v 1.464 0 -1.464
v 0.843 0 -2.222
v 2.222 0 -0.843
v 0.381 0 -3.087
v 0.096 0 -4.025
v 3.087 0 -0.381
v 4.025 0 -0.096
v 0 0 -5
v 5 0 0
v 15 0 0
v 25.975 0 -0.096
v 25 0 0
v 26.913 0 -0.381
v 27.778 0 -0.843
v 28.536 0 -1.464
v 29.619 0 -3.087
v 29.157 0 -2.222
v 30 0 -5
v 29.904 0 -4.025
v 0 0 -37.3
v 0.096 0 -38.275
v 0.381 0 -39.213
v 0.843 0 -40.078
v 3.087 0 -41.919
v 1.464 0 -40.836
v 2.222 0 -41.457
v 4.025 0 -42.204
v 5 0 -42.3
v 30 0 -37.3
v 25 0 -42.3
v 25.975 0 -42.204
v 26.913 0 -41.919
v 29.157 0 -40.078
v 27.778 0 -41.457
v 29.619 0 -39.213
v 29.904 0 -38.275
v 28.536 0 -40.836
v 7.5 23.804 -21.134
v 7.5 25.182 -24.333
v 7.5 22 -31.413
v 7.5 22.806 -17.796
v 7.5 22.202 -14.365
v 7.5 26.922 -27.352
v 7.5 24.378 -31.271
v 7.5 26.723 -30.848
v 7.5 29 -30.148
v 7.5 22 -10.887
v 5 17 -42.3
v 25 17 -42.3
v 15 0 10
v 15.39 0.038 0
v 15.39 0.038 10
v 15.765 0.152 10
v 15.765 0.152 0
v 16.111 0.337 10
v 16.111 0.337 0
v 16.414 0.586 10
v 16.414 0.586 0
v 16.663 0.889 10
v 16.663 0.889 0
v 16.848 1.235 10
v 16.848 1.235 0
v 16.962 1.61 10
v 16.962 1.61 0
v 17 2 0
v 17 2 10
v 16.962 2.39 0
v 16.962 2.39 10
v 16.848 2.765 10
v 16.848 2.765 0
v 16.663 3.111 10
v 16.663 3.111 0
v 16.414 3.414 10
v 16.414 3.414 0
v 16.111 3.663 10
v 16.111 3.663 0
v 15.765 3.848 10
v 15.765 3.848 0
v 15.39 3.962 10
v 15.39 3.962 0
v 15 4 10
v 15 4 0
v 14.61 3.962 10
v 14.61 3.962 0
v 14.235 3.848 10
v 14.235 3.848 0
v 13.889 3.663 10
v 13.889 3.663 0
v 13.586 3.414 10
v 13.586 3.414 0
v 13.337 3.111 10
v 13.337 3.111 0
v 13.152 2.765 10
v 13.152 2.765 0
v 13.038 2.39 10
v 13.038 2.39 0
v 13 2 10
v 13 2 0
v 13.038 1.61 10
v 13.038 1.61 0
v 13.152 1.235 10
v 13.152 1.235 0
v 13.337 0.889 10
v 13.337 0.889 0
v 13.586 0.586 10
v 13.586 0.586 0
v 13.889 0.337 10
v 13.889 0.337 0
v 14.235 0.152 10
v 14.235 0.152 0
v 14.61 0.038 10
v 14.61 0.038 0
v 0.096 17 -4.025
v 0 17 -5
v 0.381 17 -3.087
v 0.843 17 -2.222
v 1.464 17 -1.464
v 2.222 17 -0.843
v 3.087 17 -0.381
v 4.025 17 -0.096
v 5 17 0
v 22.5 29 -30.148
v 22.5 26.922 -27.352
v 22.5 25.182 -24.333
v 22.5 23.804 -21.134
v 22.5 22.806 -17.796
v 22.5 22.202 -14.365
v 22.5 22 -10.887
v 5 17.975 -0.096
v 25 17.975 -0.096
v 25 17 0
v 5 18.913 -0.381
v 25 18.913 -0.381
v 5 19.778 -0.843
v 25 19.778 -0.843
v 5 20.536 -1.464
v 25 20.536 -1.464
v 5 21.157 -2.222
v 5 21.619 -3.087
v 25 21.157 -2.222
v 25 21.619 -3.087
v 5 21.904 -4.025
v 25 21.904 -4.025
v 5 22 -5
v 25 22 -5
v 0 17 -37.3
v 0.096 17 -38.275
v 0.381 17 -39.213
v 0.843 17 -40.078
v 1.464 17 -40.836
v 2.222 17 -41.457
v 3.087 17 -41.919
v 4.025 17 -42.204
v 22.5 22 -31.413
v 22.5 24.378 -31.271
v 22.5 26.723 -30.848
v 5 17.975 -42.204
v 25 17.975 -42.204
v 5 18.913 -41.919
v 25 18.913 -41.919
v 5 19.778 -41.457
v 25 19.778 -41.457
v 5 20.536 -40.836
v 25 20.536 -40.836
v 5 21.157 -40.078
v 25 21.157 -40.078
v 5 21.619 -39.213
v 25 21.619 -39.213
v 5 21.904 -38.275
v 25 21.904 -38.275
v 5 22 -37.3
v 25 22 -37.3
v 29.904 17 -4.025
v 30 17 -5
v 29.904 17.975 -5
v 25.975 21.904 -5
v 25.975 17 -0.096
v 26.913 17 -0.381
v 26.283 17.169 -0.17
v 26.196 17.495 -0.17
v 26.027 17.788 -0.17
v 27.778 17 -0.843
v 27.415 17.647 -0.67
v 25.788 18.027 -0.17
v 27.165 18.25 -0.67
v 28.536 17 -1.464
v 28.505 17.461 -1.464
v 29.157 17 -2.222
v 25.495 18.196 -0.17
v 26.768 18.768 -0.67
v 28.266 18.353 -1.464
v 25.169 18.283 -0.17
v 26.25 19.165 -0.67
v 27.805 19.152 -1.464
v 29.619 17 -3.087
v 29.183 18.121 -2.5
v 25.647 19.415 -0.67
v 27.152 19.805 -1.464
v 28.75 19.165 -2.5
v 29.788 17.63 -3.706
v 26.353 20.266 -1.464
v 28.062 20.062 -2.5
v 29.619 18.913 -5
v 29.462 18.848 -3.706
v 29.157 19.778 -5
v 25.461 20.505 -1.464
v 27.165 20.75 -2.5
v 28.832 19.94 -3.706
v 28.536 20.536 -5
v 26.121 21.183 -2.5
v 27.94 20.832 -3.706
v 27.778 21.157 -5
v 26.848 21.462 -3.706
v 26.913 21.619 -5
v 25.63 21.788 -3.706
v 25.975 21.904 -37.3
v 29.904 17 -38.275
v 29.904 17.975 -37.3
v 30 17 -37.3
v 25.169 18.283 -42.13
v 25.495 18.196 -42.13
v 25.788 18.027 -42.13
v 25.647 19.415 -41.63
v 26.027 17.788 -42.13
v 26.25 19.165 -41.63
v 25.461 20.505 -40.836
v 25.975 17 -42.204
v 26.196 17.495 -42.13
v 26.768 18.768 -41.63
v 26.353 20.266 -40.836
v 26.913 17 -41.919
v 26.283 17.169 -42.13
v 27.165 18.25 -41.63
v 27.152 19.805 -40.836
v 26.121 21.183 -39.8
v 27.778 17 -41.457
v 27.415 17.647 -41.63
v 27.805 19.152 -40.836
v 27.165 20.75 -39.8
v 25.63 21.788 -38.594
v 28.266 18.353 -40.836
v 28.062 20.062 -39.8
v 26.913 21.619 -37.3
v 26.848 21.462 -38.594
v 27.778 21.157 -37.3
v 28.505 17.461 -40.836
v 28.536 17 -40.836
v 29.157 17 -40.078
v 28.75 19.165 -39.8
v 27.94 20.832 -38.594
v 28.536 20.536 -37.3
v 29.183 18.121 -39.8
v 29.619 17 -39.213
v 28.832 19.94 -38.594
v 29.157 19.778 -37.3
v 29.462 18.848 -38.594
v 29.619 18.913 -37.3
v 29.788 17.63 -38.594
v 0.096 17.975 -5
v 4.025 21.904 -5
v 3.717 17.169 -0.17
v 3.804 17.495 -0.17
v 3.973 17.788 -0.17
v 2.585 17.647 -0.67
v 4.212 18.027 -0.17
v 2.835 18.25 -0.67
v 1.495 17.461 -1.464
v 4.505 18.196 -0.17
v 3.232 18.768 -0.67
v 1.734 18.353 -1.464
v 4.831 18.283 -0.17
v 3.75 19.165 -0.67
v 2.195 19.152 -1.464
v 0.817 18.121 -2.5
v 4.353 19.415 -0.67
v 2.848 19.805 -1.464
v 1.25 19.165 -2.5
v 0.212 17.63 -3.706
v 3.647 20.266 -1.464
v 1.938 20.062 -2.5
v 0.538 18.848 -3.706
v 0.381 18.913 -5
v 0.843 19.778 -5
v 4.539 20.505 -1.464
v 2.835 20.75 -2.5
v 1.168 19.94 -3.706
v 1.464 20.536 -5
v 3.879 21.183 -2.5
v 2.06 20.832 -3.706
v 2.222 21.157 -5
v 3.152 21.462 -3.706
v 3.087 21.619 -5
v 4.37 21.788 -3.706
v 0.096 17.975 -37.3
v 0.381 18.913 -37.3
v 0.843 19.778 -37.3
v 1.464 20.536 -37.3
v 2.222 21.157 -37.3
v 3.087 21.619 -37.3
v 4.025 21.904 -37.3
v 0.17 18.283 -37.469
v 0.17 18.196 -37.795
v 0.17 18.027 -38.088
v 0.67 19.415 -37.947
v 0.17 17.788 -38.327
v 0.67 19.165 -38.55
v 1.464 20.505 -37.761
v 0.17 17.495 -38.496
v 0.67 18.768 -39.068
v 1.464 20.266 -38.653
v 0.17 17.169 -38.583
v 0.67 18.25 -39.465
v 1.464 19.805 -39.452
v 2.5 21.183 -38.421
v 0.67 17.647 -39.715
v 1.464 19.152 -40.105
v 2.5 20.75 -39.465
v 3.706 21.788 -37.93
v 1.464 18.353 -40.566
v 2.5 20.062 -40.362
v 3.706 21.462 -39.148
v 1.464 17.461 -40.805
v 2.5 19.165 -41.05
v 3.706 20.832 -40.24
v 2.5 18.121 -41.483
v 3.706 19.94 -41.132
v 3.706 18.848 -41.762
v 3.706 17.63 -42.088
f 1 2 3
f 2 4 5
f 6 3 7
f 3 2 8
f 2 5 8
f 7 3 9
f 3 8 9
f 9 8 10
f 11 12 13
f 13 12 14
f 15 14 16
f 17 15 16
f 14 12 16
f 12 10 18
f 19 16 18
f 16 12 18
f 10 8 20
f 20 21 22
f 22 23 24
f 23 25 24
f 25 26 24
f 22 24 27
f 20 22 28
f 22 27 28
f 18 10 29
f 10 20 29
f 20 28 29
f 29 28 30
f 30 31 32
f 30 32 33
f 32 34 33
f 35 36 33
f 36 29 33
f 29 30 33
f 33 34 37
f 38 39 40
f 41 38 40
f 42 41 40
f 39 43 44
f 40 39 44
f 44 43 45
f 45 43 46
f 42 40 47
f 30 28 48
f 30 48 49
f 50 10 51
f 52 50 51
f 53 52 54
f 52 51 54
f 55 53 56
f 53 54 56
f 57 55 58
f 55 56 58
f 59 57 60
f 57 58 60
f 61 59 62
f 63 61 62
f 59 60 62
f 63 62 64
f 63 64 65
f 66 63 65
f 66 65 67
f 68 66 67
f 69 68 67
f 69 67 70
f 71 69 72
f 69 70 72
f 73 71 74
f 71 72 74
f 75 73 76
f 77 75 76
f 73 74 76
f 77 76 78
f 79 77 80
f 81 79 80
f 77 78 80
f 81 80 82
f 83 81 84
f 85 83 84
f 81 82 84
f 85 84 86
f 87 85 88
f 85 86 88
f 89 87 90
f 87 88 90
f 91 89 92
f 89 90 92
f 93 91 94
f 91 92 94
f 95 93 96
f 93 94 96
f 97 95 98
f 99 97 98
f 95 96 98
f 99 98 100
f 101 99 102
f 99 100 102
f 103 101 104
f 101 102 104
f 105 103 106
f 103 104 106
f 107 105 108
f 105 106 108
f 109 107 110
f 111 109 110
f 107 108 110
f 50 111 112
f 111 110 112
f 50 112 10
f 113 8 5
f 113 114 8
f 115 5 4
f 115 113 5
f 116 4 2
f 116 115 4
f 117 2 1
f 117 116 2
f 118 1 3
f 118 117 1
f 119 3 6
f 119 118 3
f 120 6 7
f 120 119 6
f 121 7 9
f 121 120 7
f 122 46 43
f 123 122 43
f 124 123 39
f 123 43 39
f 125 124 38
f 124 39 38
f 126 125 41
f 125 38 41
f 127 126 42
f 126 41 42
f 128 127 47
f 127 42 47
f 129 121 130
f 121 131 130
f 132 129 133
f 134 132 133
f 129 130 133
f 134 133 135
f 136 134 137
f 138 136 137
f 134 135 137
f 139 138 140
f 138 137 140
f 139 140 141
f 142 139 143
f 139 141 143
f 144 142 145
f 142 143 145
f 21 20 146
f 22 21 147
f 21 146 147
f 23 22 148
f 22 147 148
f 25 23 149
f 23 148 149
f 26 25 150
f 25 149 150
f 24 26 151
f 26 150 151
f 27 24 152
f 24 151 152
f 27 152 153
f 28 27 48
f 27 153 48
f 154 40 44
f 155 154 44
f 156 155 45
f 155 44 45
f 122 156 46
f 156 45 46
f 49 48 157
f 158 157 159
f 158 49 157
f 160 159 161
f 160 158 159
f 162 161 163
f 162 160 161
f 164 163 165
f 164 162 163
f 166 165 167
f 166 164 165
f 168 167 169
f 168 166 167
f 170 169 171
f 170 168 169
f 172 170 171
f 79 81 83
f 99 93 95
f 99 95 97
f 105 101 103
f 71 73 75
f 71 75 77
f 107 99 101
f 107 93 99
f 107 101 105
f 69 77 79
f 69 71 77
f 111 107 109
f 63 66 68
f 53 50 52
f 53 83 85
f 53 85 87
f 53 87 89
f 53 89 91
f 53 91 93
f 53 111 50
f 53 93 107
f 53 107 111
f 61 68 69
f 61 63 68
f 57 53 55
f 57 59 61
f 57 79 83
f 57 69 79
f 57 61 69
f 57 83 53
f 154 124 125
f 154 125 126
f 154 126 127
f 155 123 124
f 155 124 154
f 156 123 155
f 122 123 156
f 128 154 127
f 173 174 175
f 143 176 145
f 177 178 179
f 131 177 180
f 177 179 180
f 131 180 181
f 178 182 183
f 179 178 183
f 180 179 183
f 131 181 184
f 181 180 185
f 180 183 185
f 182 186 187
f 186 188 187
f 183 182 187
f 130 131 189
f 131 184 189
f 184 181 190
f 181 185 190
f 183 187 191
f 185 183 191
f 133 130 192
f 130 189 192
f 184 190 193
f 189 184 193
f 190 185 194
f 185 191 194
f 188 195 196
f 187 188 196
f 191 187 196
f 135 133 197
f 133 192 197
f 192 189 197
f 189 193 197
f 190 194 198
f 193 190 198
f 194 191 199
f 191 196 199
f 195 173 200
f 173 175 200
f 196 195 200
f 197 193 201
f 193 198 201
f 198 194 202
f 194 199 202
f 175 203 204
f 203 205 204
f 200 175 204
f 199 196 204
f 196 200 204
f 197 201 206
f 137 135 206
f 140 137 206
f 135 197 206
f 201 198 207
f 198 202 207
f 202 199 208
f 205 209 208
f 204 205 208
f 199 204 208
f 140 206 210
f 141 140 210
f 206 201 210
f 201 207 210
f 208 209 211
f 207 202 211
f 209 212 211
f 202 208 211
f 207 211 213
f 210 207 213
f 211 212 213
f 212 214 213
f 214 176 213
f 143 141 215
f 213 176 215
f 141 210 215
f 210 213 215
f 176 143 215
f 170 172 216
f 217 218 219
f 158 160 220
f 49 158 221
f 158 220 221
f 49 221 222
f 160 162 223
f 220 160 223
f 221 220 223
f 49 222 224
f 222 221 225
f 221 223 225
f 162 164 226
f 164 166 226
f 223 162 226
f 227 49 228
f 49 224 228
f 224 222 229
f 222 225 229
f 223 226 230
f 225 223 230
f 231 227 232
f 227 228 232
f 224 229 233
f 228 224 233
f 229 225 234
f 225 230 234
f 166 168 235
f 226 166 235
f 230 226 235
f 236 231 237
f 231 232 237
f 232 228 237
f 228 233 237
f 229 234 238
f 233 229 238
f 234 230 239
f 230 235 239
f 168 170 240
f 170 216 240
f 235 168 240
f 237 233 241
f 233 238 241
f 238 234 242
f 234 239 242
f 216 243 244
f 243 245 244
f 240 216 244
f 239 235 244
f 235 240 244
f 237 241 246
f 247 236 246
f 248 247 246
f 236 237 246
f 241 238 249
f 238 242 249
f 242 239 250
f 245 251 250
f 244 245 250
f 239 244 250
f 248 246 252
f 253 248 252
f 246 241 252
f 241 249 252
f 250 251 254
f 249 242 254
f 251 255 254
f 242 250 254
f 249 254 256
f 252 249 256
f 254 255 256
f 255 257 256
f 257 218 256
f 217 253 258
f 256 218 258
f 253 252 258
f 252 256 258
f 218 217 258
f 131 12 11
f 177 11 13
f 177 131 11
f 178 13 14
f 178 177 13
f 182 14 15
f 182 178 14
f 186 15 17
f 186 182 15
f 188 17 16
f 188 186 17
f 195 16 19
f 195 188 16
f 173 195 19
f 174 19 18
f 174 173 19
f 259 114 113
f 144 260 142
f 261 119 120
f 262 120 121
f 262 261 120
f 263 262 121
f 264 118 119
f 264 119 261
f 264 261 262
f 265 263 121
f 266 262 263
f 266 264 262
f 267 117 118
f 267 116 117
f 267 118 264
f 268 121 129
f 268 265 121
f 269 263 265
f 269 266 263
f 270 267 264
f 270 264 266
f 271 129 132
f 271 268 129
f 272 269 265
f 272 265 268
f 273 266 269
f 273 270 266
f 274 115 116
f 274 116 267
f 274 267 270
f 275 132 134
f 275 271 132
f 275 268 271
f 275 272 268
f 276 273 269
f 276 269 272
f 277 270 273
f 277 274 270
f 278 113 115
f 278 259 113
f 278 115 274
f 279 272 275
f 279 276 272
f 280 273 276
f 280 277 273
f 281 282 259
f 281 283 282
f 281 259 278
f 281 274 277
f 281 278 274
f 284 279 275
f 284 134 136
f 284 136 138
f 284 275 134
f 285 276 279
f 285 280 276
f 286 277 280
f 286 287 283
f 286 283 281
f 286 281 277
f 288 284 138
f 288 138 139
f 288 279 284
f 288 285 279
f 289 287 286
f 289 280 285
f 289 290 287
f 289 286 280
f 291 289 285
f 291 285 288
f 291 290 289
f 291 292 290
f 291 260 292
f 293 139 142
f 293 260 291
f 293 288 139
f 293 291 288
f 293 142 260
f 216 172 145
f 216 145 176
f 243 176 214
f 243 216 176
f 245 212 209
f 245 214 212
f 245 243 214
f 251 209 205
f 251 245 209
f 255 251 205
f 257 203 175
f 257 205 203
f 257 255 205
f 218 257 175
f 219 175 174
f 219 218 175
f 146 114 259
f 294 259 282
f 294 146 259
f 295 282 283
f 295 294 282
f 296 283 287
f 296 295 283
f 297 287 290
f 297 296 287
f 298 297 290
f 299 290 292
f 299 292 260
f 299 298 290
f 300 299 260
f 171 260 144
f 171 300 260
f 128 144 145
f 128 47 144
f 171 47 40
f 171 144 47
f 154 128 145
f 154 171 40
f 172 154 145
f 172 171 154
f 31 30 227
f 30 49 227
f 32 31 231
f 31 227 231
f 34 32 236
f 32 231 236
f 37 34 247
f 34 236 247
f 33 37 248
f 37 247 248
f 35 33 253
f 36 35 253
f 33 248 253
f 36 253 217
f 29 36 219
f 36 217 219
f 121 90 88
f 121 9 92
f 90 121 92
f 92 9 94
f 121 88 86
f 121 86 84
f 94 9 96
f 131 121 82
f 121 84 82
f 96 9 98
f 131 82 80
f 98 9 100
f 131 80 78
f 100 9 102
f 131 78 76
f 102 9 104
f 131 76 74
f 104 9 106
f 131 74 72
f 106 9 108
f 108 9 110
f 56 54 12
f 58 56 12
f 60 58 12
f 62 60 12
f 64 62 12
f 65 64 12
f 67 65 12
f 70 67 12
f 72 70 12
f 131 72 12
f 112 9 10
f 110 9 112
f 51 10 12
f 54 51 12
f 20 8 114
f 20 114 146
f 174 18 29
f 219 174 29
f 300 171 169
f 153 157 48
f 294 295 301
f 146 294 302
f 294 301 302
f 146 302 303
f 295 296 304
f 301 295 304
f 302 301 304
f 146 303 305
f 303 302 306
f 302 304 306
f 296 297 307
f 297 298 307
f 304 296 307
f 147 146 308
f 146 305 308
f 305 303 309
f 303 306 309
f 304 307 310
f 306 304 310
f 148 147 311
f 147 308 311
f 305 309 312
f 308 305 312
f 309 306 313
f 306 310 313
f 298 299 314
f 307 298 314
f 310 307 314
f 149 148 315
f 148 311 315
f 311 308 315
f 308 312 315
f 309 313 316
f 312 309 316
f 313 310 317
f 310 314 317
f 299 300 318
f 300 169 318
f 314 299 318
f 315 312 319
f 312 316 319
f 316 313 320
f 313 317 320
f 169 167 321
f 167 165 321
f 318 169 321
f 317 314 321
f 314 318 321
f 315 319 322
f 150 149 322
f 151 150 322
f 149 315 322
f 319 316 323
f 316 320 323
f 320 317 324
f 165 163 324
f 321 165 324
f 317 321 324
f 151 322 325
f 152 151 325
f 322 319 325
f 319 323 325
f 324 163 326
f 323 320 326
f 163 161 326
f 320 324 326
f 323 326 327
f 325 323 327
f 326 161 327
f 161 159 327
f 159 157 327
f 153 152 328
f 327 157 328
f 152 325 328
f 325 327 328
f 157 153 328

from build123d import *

# Parameters (mm, degrees)
SKETCH1_W           = 30
SKETCH1_H           = 42.3
BOSS_EXTRUDE1_DEPTH = 22
SKETCH2_R           = 2
BOSS_EXTRUDE2_DEPTH = 10
FILLET2_R           = 5
BOSS_EXTRUDE4_DEPTH = 30
CUT_EXTRUDE1_DEPTH  = 7.5
CUT_EXTRUDE2_START  = -7.5
CUT_EXTRUDE2_DEPTH  = 7.5


with BuildPart() as part:
    # Sketch1 → Boss-Extrude1 (new body)
    with BuildSketch(Plane(origin=(0, 0, 0), x_dir=(1, 0, 0), z_dir=(0, 1, 0))):
        with Locations((15, 21.15)):
            Rectangle(SKETCH1_W, SKETCH1_H)
    extrude(amount=BOSS_EXTRUDE1_DEPTH)

    # Sketch2 → Boss-Extrude2 (add)
    with BuildSketch(Plane.XY):
        with Locations(Location((15, 2, 0), (0, 0, 270))):
            Circle(SKETCH2_R)
    extrude(amount=BOSS_EXTRUDE2_DEPTH)

    # Fillet2
    fillet2_edges = [part.edges().sort_by_distance(p)[0] for p in [
        (30, 22, -21.15),
        (15, 22, -42.3),
        (0, 22, -21.15),
        (0, 11, -42.3),
        (30, 11, -42.3),
        (30, 11, 0),
        (0, 11, 0),
        (15, 22, 0),
    ]]
    fillet(fillet2_edges, radius=FILLET2_R)

    # Sketch5 → Boss-Extrude4 (add)
    with BuildSketch(Plane(origin=(0, 0, 0), x_dir=(0, 0, -1), z_dir=(1, 0, 0))):
        with BuildLine():
            Line((10.886815905, 22), (31.413184095, 22))
            ThreePointArc((31.413184095, 22), (31.094391882, 25.55669229), (30.14817809, 29))
            ThreePointArc((30.14817809, 29), (21.133767679, 23.804255316), (10.886815905, 22))
        make_face()
    extrude(amount=BOSS_EXTRUDE4_DEPTH)

    # Sketch6 → Cut-Extrude1 (cut)
    with BuildSketch(Plane.ZY):
        with BuildLine():
            Line((-10.886815905, 22), (-31.413184095, 22))
            ThreePointArc((-31.413184095, 22), (-31.094391882, 25.55669229), (-30.14817809, 29))
            ThreePointArc((-30.14817809, 29), (-21.133767679, 23.804255316), (-10.886815905, 22))
        make_face()
    extrude(amount=-CUT_EXTRUDE1_DEPTH, mode=Mode.SUBTRACT)

    # Sketch7 → Cut-Extrude2 (cut)
    with BuildSketch(Plane(origin=(30, 0, 0), x_dir=(0, 0, -1), z_dir=(1, 0, 0)).offset(CUT_EXTRUDE2_START)):
        with BuildLine():
            Line((10.886815905, 22), (31.413184095, 22))
            ThreePointArc((31.413184095, 22), (31.094391882, 25.55669229), (30.14817809, 29))
            ThreePointArc((30.14817809, 29), (21.133767679, 23.804255316), (10.886815905, 22))
        make_face()
    extrude(amount=CUT_EXTRUDE2_DEPTH, mode=Mode.SUBTRACT)


solid = part.part
